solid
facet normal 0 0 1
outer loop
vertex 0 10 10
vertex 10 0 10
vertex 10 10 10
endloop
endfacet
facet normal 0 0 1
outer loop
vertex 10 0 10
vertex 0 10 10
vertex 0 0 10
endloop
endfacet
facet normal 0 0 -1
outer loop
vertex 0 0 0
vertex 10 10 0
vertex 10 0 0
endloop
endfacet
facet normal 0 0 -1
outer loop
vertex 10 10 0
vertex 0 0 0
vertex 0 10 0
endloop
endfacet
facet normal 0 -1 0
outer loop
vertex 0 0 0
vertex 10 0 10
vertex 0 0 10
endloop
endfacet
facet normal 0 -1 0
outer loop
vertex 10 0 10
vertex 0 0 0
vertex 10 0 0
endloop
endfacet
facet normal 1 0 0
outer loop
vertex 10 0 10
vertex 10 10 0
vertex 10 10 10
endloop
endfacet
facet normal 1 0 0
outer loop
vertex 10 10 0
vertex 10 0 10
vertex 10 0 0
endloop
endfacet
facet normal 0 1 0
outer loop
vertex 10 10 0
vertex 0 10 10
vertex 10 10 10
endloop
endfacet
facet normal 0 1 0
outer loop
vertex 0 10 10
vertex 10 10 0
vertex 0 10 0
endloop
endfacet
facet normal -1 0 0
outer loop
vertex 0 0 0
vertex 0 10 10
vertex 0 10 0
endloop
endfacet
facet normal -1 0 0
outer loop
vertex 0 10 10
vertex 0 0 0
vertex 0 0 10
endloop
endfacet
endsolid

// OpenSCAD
// file: error.scad
//error.scad
a=10;   // syntax error
b=2;

module errmod() { cube(a); }

errmod();
// main file
//mainincludingerror.scad
include <error.scad>
echo(version());
